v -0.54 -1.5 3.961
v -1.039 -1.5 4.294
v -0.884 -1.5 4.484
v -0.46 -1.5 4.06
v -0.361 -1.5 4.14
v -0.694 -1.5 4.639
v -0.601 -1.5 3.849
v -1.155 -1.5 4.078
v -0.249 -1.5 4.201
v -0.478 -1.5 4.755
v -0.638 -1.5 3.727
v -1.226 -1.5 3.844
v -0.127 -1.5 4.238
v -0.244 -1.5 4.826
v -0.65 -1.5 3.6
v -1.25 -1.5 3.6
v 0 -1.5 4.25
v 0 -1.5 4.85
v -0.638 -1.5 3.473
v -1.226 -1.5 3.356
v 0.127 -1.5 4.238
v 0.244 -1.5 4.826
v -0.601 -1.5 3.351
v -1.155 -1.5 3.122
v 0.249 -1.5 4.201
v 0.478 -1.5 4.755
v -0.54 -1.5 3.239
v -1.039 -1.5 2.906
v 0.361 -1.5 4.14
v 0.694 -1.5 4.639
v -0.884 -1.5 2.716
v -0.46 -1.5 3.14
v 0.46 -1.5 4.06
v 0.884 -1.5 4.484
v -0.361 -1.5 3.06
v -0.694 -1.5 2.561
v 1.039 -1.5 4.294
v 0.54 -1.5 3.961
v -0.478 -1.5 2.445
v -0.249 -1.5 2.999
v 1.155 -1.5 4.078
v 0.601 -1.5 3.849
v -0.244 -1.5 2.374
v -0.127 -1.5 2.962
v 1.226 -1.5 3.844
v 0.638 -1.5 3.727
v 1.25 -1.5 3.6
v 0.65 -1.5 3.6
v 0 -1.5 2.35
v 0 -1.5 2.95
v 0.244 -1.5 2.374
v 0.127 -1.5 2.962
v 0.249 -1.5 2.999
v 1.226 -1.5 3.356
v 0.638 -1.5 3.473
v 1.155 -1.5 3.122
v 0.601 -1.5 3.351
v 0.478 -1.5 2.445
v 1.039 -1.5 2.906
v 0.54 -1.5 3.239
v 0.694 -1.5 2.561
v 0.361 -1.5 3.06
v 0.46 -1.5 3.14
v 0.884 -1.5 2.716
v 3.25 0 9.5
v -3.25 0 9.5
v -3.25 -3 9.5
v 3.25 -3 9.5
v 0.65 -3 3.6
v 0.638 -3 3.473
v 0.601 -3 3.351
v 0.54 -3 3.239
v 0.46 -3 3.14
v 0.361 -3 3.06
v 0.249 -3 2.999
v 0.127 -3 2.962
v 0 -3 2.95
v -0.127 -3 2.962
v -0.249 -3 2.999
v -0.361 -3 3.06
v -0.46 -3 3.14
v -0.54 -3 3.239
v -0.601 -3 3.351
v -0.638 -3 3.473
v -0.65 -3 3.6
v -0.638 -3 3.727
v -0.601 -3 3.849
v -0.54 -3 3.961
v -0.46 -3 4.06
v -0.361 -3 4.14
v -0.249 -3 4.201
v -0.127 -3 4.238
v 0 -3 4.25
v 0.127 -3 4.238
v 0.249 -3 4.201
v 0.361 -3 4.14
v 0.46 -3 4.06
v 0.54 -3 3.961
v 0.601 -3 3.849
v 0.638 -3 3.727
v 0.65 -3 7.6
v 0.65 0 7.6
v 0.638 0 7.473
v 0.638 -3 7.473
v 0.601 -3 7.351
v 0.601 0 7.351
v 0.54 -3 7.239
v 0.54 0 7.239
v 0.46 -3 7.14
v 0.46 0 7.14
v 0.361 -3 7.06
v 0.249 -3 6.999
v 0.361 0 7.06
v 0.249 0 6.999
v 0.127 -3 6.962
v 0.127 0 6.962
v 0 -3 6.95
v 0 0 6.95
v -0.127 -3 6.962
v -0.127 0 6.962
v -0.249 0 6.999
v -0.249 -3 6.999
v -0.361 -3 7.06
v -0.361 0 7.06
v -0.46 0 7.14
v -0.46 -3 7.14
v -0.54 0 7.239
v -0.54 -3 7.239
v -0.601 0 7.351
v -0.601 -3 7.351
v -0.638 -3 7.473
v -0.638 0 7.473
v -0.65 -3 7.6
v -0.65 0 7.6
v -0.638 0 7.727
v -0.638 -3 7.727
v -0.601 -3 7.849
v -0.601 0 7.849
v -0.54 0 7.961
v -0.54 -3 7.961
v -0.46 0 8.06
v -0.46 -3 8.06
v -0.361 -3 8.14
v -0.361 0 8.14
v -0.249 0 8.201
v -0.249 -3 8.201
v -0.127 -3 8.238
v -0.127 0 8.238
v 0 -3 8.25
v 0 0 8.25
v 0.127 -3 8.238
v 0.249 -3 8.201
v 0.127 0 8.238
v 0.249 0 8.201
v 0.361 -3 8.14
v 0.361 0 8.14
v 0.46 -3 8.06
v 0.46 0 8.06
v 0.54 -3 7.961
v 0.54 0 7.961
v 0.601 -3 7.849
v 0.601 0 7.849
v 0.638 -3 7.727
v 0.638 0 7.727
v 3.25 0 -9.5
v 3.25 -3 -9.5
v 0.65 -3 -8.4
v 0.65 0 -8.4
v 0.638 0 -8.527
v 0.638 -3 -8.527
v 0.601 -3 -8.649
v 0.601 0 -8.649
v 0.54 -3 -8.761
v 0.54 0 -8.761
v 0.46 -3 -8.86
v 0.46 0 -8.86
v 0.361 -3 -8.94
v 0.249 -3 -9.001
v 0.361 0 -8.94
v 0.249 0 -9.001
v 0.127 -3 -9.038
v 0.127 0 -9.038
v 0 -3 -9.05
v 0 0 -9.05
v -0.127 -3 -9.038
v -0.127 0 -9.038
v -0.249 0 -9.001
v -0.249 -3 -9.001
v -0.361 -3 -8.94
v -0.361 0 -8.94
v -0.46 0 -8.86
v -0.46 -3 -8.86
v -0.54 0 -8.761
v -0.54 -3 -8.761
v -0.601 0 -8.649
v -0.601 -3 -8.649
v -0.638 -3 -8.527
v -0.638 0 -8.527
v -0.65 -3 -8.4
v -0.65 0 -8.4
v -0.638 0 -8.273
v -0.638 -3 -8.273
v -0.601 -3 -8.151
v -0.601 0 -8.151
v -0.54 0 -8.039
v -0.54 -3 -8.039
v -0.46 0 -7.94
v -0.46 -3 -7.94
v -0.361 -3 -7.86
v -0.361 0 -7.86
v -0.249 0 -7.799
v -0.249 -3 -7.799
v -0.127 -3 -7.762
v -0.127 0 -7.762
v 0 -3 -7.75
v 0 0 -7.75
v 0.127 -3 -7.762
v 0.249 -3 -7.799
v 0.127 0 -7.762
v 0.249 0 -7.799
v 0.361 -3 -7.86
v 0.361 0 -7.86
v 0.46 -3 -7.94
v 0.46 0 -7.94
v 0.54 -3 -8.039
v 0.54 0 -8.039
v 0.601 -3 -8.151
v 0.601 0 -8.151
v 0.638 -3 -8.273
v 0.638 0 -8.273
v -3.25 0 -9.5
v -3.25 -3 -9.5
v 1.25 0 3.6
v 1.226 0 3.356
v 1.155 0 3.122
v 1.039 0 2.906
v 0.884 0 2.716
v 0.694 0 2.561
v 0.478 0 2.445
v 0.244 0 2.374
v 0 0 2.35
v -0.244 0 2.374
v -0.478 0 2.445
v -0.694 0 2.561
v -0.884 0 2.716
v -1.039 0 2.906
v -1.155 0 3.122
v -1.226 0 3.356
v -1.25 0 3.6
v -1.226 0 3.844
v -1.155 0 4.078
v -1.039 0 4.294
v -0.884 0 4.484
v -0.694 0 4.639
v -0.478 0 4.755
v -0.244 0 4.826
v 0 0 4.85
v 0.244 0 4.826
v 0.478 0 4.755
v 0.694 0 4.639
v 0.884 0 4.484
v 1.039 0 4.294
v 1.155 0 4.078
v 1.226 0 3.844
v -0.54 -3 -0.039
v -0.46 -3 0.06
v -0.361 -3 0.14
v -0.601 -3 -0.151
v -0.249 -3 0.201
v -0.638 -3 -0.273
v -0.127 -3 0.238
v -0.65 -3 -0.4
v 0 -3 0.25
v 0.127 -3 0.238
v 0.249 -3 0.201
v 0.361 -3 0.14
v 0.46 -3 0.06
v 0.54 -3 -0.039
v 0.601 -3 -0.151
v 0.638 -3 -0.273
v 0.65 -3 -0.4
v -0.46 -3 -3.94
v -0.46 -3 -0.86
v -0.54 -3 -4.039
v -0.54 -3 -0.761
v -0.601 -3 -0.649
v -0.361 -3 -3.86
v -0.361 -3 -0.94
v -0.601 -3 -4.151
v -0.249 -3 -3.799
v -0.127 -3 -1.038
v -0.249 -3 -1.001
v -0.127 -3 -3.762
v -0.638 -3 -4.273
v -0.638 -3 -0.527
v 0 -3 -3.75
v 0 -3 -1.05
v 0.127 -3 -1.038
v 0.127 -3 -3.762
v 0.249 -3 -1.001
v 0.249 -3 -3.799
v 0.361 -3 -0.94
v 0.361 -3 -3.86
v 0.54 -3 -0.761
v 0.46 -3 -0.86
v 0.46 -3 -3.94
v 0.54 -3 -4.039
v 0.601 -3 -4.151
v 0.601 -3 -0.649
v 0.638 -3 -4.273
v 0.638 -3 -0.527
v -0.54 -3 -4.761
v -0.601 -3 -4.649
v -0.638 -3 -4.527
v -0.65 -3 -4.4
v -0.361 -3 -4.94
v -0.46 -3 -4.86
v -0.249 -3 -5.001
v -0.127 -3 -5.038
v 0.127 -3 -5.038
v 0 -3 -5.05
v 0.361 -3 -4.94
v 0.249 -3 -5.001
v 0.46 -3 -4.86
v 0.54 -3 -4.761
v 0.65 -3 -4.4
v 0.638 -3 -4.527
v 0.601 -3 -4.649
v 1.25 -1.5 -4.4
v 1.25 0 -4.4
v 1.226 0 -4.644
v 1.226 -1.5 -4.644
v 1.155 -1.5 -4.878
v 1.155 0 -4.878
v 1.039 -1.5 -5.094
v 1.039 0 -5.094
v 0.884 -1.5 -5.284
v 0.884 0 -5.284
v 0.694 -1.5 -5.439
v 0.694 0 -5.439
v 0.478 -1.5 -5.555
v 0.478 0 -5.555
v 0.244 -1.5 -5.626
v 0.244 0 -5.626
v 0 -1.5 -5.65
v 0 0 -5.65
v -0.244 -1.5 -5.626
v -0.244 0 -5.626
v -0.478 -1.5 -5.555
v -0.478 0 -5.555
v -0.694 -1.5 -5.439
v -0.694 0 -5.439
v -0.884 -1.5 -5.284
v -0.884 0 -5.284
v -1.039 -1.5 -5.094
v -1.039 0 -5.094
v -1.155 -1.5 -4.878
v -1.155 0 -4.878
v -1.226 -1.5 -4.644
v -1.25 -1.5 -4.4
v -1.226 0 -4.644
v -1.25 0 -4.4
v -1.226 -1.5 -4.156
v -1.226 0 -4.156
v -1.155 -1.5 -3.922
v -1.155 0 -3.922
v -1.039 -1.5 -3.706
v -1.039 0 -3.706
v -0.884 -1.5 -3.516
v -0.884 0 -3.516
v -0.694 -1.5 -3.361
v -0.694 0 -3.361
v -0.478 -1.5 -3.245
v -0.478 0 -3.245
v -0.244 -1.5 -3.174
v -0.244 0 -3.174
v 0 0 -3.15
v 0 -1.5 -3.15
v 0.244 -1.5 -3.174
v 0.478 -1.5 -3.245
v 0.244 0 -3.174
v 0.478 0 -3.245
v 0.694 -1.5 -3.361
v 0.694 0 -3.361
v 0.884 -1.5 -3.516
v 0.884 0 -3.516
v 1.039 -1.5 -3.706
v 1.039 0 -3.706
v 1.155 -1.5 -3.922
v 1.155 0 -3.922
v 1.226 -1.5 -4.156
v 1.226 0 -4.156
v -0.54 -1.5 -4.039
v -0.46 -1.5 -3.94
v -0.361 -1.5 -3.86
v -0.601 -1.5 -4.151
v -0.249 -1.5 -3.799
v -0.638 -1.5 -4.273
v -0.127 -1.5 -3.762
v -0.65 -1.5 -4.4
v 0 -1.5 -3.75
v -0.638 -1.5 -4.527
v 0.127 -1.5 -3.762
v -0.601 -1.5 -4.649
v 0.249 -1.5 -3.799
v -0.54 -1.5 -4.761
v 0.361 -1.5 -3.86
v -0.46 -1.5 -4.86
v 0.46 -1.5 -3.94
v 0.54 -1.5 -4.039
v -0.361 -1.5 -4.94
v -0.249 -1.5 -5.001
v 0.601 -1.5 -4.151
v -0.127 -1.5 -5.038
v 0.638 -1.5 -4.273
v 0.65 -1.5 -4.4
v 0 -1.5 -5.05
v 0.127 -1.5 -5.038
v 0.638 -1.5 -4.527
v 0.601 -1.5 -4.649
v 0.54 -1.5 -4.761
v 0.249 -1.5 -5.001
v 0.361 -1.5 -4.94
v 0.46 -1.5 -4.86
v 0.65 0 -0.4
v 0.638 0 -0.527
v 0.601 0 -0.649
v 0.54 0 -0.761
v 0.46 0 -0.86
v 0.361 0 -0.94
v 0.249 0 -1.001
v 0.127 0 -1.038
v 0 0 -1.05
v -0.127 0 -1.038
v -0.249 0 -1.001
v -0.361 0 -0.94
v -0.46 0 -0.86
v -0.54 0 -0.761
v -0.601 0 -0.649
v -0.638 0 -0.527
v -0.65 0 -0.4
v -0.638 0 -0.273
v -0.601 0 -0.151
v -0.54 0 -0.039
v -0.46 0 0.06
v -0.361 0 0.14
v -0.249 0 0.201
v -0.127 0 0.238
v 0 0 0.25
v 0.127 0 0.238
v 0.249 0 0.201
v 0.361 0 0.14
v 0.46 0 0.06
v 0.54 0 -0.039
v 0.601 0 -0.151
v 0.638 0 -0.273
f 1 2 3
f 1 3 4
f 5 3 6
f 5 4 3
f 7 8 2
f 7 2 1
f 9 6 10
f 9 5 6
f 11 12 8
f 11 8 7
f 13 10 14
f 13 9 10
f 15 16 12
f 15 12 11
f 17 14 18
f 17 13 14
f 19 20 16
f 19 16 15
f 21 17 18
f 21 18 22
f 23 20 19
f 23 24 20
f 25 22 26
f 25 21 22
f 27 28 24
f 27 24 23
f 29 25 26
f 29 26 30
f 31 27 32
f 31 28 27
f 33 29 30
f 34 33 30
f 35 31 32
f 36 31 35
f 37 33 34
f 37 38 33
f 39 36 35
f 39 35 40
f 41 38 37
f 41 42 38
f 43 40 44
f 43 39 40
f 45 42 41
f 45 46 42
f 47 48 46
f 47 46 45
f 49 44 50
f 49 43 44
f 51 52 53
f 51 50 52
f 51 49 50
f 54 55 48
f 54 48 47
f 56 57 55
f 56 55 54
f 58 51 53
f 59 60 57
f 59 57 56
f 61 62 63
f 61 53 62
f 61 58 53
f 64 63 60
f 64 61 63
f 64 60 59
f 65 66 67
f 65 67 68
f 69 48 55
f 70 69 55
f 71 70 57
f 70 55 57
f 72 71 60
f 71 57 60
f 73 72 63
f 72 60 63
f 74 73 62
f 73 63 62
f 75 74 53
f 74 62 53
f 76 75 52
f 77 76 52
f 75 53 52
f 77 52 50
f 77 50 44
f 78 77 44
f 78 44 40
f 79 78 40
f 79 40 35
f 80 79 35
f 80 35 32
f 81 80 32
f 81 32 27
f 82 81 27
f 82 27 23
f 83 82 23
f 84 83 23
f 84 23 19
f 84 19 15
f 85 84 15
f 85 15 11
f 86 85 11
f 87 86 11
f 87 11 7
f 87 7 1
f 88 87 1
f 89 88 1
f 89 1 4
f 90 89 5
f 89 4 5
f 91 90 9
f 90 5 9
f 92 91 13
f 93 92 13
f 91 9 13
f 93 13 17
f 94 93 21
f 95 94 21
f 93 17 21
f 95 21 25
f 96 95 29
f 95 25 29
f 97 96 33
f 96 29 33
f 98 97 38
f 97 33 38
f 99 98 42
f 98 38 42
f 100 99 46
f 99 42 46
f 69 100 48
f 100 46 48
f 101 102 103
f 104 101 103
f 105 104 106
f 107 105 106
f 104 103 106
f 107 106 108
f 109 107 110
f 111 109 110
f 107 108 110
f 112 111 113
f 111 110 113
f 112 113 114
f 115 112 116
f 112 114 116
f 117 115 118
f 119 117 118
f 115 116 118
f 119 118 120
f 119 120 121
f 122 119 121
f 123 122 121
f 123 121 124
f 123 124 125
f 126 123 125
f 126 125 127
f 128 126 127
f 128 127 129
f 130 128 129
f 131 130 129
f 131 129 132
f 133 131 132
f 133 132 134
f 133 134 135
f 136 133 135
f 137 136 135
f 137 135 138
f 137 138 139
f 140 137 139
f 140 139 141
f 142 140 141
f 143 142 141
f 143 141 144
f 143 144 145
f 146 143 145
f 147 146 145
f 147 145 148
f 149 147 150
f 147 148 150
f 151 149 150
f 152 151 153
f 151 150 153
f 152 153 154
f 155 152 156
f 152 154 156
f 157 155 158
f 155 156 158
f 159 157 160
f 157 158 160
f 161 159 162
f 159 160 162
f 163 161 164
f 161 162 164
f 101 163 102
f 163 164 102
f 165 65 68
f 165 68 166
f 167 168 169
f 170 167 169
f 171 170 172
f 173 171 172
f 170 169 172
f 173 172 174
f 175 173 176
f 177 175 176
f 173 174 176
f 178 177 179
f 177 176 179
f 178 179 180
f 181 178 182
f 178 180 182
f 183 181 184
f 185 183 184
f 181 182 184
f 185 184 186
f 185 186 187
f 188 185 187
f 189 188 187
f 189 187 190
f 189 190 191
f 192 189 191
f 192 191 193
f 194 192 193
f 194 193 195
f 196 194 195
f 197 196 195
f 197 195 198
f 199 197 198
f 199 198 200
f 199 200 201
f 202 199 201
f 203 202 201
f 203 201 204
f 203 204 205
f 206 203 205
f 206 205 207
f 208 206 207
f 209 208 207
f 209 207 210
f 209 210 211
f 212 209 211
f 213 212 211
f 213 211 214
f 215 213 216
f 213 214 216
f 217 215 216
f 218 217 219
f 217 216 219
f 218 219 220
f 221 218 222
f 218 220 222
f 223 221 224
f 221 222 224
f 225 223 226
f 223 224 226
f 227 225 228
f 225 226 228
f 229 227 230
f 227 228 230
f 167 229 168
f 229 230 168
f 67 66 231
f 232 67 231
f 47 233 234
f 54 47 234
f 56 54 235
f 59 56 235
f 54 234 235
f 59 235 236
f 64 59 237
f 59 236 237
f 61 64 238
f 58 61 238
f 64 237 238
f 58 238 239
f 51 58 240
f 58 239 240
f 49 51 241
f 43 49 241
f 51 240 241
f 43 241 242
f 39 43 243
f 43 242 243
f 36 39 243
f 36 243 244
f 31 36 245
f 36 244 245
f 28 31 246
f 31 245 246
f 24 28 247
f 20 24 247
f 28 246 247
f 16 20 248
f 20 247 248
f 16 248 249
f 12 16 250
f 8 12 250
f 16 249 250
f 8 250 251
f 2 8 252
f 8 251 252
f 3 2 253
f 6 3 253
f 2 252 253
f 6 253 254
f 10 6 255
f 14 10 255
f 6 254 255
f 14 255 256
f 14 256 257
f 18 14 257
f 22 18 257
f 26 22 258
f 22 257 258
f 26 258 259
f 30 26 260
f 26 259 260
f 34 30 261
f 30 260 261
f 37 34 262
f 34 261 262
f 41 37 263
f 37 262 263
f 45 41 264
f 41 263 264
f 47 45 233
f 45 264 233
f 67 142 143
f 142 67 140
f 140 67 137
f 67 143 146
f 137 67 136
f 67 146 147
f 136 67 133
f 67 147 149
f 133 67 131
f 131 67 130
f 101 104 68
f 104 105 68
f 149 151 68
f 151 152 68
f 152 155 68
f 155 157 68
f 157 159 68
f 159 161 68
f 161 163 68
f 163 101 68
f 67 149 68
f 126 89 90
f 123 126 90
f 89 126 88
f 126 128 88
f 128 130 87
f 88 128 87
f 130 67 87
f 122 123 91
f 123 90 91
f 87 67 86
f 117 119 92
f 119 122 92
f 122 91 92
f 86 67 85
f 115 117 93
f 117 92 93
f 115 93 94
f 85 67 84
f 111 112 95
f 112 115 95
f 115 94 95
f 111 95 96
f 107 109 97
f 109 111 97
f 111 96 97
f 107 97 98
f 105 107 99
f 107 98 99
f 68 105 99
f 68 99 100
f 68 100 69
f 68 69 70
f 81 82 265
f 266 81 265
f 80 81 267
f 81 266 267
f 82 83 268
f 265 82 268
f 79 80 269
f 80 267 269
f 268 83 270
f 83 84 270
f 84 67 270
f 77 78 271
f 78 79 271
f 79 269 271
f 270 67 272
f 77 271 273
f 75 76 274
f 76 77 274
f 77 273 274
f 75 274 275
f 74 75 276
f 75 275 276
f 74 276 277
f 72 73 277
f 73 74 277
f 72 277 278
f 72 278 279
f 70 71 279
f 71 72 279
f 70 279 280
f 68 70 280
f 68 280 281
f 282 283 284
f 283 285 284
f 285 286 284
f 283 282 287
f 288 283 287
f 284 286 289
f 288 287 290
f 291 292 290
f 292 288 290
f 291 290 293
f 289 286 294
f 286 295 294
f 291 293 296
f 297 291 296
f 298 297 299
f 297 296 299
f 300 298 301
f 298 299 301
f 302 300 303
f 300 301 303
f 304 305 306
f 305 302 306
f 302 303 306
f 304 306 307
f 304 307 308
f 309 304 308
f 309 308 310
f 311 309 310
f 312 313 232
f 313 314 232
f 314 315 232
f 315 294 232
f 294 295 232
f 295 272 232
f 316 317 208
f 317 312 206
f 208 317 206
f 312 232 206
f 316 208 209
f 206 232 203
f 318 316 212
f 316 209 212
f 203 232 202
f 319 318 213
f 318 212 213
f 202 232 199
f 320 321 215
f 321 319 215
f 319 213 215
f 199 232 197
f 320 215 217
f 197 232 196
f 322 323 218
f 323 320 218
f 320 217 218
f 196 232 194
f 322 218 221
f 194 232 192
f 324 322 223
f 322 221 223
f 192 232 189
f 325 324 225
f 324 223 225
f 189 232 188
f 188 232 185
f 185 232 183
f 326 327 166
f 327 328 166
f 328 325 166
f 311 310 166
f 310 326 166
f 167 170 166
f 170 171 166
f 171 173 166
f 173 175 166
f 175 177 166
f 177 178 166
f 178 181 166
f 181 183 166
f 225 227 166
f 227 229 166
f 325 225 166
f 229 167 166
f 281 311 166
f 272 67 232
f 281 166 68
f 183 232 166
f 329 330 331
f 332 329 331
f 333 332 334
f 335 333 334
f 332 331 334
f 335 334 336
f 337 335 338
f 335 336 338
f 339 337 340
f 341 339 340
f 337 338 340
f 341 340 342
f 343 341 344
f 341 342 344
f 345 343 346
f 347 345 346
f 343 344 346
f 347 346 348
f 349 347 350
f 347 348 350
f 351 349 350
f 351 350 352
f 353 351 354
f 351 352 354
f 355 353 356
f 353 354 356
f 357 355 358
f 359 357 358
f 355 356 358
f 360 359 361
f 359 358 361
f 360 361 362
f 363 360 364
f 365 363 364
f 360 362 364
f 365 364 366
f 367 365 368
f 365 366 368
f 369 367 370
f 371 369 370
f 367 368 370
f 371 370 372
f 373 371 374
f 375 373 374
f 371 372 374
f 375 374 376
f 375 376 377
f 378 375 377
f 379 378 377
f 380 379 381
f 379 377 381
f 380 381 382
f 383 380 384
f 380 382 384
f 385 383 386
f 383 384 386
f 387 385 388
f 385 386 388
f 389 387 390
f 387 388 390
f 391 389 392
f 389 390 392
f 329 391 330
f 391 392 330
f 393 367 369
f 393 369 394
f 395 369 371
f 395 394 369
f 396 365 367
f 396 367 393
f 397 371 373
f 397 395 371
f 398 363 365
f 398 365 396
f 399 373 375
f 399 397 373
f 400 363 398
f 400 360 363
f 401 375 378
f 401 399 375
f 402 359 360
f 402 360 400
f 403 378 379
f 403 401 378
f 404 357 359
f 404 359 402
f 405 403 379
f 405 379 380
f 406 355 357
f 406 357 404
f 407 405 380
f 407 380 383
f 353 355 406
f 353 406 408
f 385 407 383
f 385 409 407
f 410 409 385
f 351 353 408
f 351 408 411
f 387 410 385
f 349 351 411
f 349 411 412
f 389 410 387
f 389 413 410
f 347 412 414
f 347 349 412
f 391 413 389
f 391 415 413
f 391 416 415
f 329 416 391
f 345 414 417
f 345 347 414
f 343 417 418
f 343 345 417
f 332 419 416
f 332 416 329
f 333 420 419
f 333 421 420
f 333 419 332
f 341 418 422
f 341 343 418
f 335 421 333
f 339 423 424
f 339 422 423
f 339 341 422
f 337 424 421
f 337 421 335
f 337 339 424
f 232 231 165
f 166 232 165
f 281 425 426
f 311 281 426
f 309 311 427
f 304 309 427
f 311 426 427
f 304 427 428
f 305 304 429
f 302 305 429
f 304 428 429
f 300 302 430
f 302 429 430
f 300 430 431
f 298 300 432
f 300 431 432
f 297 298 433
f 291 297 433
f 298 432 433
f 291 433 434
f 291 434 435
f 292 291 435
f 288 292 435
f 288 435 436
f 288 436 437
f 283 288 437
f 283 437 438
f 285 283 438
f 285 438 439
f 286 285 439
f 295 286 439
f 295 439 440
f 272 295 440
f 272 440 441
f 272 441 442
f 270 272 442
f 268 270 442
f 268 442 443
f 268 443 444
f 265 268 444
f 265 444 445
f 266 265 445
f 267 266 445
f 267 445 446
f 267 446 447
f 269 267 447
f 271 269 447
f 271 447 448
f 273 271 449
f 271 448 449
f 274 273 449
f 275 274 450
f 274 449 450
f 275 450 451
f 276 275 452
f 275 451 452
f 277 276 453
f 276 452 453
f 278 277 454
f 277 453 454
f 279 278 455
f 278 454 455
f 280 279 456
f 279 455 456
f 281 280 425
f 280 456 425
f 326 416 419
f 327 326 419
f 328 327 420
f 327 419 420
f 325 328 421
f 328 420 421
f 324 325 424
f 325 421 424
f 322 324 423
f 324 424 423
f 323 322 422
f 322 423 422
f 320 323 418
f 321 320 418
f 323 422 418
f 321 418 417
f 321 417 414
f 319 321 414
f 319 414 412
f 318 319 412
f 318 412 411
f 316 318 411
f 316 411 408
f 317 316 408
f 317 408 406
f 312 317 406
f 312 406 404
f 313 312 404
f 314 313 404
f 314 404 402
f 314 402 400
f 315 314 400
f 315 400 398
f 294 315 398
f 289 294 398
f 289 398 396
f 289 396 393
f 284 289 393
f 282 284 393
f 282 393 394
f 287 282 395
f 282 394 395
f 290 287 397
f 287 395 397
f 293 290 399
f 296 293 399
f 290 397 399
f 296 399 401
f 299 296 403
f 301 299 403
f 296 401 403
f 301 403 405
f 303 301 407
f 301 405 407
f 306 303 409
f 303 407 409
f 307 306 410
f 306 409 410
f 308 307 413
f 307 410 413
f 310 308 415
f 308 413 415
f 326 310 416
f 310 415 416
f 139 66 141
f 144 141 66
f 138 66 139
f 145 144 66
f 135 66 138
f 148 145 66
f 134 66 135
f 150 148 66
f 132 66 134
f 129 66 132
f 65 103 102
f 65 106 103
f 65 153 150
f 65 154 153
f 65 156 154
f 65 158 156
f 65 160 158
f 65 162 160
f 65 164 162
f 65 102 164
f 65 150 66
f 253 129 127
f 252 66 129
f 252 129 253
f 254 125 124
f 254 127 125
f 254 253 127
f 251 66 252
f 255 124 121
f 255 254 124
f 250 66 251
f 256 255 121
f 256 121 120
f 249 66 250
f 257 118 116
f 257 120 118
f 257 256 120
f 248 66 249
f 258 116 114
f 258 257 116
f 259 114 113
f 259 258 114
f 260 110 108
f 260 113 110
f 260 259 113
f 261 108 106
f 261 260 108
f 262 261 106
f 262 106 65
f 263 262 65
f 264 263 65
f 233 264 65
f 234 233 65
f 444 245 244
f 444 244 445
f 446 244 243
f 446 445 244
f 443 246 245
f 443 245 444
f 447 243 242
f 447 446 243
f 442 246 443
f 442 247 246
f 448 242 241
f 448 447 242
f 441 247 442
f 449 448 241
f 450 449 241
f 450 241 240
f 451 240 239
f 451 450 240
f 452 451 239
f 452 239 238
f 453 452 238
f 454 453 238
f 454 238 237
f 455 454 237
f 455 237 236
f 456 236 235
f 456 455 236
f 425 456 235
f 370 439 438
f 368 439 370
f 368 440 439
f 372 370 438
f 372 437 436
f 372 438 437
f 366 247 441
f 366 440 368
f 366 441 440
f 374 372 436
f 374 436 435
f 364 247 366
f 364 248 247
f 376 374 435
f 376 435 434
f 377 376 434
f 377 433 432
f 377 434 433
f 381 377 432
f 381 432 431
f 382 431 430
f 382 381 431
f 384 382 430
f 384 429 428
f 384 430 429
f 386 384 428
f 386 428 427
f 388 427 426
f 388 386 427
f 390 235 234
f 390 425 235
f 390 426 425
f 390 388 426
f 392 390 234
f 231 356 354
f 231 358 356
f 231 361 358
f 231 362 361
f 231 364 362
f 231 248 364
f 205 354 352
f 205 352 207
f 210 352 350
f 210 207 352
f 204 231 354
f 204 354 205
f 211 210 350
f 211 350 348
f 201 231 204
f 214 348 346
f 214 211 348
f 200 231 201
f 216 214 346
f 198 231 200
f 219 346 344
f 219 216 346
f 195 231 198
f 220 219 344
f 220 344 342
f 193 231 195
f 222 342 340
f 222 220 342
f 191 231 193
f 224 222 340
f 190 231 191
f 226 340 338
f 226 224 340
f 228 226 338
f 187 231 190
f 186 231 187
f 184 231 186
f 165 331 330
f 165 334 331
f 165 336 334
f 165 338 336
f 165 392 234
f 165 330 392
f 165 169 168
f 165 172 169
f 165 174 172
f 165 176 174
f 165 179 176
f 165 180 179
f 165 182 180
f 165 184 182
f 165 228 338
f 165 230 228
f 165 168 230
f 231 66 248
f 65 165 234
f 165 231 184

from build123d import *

# Parameters (mm, degrees)
SKETCH1_W                    = 6.5
SKETCH1_H                    = 19
BOSS_BODY_DEPTH              = 3
SKETCH2_R                    = 0.65
CUT_SCREW_HOLES_DEPTH        = 4
SKETCH4_R                    = 1.25
CUT_SCREW_HEAD_POCKETS_DEPTH = 1.5


with BuildPart() as part:
    # Sketch1 → Boss-Body (new body)
    with BuildSketch(Plane(origin=(0, 0, 0), x_dir=(1, 0, 0), z_dir=(0, 1, 0))):
        Rectangle(SKETCH1_W, SKETCH1_H)
    extrude(amount=-BOSS_BODY_DEPTH)

    # Sketch2 → Cut-Screw Holes (cut, through all)
    with BuildSketch(Plane(origin=(0, 0, 0), x_dir=(1, 0, 0), z_dir=(0, 1, 0))):
        with Locations((0, -7.6)):
            Circle(SKETCH2_R)
        with Locations((0, 0.4)):
            Circle(SKETCH2_R)
        with Locations((0, 8.4)):
            Circle(SKETCH2_R)
        with Locations((0, 4.4)):
            Circle(SKETCH2_R)
        with Locations((0, -3.6)):
            Circle(SKETCH2_R)
    extrude(amount=-CUT_SCREW_HOLES_DEPTH, mode=Mode.SUBTRACT)

    # Sketch4 → Cut-Screw Head Pockets (cut)
    with BuildSketch(Plane(origin=(0, 0, 0), x_dir=(1, 0, 0), z_dir=(0, 1, 0))):
        with Locations((0, 4.4)):
            Circle(SKETCH4_R)
        with Locations((0, -3.6)):
            Circle(SKETCH4_R)
    extrude(amount=-CUT_SCREW_HEAD_POCKETS_DEPTH, mode=Mode.SUBTRACT)


solid = part.part
